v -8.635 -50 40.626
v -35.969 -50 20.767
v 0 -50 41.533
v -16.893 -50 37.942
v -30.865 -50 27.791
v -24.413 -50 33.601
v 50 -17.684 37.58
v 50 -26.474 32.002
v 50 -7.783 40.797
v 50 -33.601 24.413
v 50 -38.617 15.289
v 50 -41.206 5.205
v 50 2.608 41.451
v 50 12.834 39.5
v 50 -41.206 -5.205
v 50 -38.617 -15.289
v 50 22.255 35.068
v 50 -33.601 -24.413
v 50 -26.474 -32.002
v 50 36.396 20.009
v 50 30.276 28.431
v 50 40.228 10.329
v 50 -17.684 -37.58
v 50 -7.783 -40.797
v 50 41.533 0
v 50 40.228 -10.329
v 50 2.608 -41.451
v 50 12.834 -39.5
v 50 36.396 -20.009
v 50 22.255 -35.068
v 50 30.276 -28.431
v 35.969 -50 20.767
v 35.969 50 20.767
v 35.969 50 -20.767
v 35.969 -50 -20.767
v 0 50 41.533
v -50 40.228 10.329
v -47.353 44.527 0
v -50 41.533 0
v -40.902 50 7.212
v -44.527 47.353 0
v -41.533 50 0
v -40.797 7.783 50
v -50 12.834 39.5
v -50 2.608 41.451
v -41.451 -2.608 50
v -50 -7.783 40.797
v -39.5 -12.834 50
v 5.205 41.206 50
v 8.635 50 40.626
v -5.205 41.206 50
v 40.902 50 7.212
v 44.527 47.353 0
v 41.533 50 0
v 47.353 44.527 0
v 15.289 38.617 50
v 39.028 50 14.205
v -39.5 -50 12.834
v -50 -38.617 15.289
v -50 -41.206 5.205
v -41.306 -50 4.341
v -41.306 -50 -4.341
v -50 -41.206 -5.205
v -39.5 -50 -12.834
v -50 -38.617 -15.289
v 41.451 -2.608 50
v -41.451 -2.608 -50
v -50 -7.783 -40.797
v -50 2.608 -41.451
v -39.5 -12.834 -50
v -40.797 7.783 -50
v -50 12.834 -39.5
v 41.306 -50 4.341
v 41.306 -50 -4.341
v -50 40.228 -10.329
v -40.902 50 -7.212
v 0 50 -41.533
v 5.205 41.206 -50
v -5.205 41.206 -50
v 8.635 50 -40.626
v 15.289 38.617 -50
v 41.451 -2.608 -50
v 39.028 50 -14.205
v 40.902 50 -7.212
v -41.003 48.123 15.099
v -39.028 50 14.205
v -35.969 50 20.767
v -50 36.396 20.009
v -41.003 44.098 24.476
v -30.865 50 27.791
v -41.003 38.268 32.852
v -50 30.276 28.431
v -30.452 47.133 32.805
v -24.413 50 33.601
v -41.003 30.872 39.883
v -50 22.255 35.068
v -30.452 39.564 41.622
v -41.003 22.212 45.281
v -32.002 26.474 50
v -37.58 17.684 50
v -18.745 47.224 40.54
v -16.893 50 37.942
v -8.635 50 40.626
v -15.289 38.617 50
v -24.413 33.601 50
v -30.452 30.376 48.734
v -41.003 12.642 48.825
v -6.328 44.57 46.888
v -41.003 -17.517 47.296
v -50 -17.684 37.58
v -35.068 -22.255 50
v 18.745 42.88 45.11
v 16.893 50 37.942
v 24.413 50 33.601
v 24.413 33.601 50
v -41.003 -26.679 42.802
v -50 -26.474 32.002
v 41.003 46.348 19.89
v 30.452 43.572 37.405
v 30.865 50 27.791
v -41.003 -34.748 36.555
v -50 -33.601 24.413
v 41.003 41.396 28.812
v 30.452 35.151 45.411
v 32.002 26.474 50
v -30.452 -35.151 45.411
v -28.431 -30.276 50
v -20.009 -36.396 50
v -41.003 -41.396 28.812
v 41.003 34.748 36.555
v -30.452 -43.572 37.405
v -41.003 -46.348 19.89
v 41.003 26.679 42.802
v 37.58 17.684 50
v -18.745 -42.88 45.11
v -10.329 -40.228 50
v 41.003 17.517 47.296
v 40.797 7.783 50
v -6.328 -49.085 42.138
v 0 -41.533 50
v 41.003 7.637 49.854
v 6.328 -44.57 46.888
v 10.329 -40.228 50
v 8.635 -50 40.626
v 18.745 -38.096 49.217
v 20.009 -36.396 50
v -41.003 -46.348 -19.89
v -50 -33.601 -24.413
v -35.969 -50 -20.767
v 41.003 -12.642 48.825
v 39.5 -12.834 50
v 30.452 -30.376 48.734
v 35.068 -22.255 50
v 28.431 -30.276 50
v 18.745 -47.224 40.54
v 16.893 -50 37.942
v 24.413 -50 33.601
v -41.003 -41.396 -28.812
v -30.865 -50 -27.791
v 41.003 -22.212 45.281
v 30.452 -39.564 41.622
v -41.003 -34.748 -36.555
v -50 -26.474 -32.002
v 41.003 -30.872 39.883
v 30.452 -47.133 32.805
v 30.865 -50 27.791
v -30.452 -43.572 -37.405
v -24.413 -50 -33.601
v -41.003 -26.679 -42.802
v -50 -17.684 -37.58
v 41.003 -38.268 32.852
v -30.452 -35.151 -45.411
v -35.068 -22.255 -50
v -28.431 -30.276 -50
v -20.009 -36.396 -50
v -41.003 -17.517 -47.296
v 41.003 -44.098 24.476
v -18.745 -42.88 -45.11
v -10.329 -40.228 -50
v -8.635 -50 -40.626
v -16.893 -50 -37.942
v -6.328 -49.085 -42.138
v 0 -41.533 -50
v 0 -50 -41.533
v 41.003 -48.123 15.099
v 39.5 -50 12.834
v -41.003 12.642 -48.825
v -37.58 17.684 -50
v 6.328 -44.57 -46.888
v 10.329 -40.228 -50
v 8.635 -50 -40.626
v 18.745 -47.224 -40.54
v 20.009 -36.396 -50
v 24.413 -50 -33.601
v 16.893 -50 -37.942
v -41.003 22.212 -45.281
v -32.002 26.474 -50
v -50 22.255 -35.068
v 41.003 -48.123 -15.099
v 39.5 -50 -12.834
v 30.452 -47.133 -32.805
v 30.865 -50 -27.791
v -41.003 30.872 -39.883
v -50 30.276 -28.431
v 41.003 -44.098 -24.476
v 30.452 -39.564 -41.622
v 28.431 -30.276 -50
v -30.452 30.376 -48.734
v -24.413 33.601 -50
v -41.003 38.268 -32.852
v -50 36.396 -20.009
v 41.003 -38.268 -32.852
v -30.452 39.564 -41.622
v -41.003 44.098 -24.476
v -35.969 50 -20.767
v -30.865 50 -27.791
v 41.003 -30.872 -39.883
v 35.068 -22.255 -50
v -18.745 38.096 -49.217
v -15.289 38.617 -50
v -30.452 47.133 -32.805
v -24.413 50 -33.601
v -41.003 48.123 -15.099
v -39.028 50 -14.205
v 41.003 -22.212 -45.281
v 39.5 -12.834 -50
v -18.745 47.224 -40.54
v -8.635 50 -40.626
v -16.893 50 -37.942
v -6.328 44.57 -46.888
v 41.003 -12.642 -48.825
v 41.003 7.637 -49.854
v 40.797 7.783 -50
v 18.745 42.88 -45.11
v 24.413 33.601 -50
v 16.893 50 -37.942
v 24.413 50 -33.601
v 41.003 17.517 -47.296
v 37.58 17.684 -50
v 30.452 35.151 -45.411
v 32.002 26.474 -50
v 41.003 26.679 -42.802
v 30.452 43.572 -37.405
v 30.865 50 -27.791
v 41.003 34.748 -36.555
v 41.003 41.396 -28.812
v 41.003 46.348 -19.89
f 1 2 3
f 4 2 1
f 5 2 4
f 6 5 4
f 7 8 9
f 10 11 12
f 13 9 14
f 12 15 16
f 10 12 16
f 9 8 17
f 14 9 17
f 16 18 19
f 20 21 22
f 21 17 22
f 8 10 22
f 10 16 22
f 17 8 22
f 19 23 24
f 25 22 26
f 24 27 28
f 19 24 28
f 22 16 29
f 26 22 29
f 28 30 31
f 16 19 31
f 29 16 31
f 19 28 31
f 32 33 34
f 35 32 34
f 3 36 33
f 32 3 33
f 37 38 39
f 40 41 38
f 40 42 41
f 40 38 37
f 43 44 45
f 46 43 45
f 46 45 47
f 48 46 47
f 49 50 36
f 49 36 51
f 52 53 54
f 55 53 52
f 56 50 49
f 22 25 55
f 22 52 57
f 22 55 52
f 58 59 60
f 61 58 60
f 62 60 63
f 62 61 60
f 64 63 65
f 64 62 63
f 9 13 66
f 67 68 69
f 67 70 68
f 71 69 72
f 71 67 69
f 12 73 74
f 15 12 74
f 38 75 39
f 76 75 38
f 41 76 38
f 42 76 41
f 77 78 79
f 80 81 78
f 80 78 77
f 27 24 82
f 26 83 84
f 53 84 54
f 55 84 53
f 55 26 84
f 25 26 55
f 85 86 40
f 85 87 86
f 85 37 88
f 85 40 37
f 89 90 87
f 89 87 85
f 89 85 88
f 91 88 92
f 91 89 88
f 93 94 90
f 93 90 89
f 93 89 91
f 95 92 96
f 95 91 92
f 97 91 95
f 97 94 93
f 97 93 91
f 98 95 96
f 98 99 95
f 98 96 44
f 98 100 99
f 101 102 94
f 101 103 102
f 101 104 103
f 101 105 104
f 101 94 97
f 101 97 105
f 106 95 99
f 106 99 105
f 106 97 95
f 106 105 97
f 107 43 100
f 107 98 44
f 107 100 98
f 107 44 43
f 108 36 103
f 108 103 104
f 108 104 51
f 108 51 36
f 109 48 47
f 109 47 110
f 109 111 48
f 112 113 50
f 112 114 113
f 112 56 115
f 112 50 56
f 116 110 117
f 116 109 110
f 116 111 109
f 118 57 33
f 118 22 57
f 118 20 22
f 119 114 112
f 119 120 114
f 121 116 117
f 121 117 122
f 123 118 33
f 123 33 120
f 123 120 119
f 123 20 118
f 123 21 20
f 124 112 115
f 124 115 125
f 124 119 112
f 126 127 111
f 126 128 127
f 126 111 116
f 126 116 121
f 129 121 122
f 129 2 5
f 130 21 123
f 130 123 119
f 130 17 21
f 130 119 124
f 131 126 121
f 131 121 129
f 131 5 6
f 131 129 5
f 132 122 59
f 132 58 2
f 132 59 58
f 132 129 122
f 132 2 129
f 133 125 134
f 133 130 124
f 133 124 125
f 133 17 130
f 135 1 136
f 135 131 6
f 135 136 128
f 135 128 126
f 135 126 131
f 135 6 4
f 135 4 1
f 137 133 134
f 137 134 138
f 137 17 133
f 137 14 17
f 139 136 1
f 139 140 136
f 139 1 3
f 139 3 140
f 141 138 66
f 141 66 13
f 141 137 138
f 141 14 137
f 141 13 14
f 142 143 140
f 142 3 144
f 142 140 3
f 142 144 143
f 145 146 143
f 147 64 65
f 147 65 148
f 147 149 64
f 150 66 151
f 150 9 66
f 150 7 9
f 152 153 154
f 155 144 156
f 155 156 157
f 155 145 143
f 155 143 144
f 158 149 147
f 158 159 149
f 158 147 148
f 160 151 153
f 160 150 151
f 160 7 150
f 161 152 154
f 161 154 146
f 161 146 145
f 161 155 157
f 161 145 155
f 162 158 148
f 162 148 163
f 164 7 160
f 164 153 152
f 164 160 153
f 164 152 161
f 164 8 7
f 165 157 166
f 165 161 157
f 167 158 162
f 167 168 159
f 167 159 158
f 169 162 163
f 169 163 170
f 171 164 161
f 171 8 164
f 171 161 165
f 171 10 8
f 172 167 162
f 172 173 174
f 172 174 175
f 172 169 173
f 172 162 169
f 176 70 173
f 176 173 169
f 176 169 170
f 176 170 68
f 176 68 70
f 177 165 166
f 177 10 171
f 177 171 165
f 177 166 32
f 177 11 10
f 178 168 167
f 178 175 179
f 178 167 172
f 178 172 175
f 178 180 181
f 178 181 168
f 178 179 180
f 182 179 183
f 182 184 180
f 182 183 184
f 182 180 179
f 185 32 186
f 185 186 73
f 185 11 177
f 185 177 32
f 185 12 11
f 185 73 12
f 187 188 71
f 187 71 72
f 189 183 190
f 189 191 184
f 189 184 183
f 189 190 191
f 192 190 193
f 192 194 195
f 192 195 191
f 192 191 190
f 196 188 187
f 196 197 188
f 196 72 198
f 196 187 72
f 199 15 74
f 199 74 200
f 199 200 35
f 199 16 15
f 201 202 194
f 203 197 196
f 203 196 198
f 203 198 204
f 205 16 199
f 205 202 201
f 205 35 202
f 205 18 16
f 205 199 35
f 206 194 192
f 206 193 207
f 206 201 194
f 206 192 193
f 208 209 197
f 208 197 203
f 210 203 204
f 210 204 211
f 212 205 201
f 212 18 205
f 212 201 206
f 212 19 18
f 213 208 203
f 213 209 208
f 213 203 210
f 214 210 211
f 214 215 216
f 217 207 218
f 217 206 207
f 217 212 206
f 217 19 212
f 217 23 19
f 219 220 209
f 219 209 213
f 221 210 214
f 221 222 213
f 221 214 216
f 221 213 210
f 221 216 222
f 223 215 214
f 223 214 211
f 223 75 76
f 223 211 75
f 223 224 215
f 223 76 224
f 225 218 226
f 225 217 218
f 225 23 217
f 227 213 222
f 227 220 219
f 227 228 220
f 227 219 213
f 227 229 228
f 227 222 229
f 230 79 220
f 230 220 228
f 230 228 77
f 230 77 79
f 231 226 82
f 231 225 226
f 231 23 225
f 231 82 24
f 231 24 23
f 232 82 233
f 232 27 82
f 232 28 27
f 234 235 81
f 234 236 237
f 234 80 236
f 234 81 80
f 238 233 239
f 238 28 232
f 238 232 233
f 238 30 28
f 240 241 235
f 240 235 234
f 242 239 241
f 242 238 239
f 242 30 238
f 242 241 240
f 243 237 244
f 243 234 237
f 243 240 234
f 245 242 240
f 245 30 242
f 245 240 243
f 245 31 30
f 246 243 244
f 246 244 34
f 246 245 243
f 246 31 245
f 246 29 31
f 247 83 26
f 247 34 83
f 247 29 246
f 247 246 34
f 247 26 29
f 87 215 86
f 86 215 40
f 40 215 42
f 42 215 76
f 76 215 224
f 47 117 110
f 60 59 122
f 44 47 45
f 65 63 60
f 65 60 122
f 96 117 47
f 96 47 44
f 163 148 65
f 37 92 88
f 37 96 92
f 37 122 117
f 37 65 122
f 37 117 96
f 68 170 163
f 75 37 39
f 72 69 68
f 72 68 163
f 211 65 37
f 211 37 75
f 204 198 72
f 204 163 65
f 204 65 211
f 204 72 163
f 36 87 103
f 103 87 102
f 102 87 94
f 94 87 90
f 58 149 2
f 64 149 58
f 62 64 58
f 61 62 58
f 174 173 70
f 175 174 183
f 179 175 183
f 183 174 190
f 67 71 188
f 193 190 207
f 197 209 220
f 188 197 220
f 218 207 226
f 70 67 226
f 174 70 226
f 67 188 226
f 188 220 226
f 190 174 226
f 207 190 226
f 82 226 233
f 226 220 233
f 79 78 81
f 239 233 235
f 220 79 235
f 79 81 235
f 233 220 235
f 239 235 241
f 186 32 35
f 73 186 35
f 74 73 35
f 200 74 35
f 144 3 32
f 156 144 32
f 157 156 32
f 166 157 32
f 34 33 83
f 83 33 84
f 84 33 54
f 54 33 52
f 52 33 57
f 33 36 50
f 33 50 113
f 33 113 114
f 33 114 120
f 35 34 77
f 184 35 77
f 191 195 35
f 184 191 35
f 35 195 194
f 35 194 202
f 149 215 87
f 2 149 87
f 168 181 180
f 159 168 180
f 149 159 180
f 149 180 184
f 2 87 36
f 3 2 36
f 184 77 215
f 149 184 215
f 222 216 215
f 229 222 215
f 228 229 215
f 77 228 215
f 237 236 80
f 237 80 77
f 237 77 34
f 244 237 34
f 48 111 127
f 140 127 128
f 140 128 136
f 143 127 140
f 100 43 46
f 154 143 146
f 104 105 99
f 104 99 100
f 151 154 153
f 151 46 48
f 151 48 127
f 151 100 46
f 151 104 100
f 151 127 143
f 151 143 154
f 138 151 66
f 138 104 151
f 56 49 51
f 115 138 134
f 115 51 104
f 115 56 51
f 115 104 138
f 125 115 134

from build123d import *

# Parameters (mm, degrees)
P_IDAT_VYSUNUT_M1_DEPTH      = 50
P_IDAT_VYSUNUT_M1_DEPTH_BACK = 50
SKICA2_W                     = 100
SKICA2_H                     = 100
ODEBRAT_VYSUNUT_M1_DEPTH     = 123.474487139


with BuildPart() as part:
    # Skica1 → Rotovat1 (revolve)
    with BuildSketch(Plane.XY):
        with BuildLine():
            Line((0, 0), (-65, 0))
            ThreePointArc((-65, 0), (0, 65), (65, 0))
            Line((65, 0), (0, 0))
        make_face()
    revolve(axis=Axis((0, 0, 0), (1, 0, 0)))


with BuildPart() as body_2:
    # Skica2 → Přidat vysunutím1 (new, two sides: drawn at the far end of the back side and taken through both)
    with BuildSketch(Plane.XY.offset(-P_IDAT_VYSUNUT_M1_DEPTH_BACK)):
        Rectangle(SKICA2_W, SKICA2_H)
    extrude(amount=P_IDAT_VYSUNUT_M1_DEPTH + P_IDAT_VYSUNUT_M1_DEPTH_BACK)


with BuildPart() as part_1:
    add(part.part)

    # Průsečík1: read off the stored shape, not the designer's step
    # Průsečík1: intersect body 2
    add(body_2.part, mode=Mode.INTERSECT)

    # Skica3 → Odebrat vysunutím1 (cut, through all)
    with BuildSketch(Plane(origin=(0, 50, 0), x_dir=(1, 0, 0), z_dir=(0, 1, 0))):
        Polygon((0, 41.533119315), (-35.968736425, 20.766559657), (-35.968736425, -20.766559657), (0, -41.533119315), (35.968736425, -20.766559657), (35.968736425, 20.766559657), align=None)
    extrude(amount=-ODEBRAT_VYSUNUT_M1_DEPTH, mode=Mode.SUBTRACT)


solid = part_1.part
